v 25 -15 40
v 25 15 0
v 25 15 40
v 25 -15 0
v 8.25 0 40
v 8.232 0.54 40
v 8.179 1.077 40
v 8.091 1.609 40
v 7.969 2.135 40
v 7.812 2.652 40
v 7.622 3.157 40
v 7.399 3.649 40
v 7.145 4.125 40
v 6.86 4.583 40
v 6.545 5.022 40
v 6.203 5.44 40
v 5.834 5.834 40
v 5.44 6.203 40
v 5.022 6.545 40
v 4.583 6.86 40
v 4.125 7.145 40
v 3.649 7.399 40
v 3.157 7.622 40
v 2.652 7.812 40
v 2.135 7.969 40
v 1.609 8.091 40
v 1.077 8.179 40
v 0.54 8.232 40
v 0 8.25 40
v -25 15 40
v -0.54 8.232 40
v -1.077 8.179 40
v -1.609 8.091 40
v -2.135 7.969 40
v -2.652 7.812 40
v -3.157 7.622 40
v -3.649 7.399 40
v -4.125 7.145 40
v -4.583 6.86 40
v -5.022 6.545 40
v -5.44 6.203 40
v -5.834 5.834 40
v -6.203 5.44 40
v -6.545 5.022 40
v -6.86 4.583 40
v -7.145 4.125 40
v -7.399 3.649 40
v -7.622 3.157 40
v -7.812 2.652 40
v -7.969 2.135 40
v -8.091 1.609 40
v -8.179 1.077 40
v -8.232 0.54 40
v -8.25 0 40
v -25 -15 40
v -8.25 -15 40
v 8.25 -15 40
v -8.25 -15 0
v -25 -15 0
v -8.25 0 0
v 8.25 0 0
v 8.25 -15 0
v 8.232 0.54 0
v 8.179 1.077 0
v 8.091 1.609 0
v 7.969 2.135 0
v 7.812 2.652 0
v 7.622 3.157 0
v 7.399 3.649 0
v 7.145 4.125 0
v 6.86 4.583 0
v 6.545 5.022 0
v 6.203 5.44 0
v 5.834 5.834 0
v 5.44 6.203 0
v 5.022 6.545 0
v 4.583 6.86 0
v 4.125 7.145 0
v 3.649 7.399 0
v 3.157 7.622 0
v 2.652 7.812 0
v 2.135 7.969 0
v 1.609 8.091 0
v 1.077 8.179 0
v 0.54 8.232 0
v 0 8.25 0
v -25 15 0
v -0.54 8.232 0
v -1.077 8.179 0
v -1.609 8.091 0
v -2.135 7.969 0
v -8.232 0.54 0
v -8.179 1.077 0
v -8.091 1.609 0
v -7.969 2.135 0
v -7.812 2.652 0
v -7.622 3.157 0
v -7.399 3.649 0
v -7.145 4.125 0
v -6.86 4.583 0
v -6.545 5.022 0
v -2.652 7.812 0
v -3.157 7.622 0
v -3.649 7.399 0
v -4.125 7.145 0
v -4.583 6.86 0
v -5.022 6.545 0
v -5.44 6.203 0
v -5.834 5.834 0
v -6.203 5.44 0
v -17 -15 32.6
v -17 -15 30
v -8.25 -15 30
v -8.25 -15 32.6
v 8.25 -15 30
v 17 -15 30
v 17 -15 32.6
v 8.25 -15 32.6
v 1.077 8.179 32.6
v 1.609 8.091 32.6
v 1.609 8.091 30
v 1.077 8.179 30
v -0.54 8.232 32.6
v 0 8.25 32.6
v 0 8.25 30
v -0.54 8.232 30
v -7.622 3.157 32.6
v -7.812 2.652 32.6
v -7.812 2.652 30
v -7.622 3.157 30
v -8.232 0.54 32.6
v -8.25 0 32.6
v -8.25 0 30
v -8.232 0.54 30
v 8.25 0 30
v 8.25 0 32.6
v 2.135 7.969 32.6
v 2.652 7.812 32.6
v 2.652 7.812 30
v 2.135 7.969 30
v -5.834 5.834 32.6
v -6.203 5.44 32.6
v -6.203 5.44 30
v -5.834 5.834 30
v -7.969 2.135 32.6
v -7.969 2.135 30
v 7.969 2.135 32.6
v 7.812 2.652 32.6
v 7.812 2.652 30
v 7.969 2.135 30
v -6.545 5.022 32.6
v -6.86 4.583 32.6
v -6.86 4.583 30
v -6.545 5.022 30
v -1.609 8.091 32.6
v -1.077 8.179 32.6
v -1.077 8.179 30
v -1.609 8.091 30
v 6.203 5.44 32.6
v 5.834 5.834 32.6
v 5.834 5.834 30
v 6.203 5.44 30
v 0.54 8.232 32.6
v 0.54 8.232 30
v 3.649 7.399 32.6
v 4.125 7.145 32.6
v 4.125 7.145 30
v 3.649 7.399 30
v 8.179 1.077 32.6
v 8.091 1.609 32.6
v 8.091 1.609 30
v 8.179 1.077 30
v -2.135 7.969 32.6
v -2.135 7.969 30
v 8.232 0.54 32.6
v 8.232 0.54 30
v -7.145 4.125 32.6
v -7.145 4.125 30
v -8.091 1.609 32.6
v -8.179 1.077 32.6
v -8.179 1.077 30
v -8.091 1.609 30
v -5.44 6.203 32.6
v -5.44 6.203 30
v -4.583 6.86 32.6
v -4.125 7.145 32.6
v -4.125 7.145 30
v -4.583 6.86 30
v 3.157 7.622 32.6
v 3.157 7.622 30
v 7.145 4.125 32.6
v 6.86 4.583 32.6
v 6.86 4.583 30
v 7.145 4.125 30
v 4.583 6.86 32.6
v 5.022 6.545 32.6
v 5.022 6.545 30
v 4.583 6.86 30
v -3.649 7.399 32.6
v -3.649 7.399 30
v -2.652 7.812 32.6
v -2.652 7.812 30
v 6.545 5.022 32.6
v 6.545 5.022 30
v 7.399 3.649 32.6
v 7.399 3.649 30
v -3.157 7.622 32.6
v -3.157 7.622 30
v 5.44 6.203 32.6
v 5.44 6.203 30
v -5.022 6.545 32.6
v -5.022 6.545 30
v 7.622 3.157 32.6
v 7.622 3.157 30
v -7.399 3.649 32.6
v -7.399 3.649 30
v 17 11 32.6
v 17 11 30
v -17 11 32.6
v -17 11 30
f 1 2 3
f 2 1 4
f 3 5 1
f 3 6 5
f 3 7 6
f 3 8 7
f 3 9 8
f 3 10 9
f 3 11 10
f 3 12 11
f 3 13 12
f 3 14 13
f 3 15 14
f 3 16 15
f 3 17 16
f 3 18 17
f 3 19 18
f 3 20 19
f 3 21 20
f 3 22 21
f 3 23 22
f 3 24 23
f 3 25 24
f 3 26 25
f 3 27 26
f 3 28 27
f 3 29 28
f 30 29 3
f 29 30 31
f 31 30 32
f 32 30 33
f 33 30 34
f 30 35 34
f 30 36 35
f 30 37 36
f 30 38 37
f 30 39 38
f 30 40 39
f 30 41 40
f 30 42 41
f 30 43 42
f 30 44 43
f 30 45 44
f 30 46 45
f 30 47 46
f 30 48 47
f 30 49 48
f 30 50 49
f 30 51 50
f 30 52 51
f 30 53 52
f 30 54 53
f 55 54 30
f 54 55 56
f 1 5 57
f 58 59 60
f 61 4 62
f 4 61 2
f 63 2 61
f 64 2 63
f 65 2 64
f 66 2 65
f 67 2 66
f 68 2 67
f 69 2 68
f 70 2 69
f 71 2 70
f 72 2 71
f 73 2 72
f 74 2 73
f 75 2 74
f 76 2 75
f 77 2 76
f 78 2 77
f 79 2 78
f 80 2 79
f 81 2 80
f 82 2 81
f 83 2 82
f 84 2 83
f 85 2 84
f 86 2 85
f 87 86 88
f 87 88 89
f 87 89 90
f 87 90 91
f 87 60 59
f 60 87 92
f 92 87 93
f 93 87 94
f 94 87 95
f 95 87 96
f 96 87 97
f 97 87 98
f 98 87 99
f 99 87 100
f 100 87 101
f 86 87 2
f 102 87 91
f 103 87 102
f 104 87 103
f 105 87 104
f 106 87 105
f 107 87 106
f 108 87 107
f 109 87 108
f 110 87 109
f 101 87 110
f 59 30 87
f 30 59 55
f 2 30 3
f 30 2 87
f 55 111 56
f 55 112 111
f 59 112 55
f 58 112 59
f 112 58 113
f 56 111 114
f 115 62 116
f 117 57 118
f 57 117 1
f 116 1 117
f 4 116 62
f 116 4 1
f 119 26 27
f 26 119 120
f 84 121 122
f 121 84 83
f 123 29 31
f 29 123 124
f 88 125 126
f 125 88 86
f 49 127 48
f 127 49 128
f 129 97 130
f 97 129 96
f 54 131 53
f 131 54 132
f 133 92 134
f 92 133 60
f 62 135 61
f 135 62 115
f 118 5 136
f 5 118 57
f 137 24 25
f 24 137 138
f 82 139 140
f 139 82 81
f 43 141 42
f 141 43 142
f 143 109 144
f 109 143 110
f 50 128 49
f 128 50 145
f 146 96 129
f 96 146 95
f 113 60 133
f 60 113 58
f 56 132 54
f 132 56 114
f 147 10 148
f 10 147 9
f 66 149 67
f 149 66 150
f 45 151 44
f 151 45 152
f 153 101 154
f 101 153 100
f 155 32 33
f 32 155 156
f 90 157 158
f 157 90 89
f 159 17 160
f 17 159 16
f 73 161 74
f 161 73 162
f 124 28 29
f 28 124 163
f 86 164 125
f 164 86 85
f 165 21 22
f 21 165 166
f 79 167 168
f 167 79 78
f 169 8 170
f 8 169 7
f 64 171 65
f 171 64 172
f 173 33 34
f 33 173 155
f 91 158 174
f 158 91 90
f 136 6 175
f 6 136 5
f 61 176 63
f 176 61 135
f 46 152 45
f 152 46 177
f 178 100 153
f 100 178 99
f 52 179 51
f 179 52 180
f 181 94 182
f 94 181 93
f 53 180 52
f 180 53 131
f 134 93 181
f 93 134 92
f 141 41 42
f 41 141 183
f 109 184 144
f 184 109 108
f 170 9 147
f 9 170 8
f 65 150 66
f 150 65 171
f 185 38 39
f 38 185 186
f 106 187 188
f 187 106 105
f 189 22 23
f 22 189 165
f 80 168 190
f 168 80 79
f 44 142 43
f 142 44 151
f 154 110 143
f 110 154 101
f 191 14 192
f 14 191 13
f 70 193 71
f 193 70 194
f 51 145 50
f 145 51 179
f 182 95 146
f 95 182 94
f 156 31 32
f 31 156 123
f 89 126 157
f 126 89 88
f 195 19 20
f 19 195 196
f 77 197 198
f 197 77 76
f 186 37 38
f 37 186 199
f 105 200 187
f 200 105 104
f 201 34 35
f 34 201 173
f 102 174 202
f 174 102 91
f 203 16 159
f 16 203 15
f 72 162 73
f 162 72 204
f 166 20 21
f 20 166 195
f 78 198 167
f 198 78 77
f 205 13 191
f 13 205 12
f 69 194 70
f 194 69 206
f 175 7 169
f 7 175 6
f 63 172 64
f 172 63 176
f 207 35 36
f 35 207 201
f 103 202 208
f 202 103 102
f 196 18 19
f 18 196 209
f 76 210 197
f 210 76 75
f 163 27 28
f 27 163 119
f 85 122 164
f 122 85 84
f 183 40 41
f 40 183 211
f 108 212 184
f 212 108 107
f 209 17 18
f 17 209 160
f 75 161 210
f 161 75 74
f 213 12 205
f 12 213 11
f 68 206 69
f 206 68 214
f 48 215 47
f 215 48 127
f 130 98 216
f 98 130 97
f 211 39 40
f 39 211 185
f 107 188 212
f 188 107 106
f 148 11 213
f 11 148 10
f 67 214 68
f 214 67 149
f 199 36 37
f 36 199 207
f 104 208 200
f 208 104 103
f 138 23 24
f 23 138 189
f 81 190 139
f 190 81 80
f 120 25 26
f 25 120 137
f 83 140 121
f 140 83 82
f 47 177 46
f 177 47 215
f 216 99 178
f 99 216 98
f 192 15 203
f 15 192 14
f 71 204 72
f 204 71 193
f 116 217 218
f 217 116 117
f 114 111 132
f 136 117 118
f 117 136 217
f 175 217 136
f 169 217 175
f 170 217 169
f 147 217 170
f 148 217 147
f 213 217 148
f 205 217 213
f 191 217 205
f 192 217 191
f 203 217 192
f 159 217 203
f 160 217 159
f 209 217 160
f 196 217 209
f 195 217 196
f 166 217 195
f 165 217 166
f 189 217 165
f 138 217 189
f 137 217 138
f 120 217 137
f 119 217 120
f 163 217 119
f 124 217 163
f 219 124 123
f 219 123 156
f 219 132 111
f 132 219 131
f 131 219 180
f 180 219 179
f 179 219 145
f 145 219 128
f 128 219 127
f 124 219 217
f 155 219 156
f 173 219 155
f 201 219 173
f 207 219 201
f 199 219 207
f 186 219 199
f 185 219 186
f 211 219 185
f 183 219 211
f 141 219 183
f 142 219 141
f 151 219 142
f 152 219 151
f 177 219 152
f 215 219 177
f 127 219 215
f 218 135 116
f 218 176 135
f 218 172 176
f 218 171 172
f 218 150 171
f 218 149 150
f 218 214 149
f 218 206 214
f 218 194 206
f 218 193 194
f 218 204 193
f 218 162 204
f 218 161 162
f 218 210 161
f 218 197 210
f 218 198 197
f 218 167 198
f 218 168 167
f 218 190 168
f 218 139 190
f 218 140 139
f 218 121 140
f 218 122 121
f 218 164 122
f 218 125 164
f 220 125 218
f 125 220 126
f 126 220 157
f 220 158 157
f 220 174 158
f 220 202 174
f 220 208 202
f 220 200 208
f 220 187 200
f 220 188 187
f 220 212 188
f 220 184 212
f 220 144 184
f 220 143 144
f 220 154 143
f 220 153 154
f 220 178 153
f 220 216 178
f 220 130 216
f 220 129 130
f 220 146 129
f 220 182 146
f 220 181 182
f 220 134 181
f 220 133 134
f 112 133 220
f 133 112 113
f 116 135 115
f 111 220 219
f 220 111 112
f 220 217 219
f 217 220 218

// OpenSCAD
// KNOWN-WRONG PART (must fail): the wall-screw holes are missing
// Wall-mounted holder for a 10 mL syringe hanging upright, tip down (gravity-feed reservoir)
// Category: hardware. A block with a vertical U-shaped barrel channel open at the front, a
// horizontal slot that takes the finger flange, and two M4 wall-screw holes from front to back.
// Print: PETG or PLA, standing on its bottom face; the flange slot roof bridges 34 mm.
// SPDX-License-Identifier: CERN-OHL-P-2.0

/* [Holder] */
block = [50, 30, 40];     // X (width), Y (depth), Z (height) [mm]; back face at y = +15
channel_w = 16.5;         // 16 mm barrel + clearance; half-circle back end centred at (0, 0)
slot = [34, 2.6];         // flange slot width (X) and height (Z)
slot_z = 30;              // slot from z = 30 to 32.6
slot_back_y = 11;         // the slot reaches from the front face back to y = 11
screw_d = 4.5;            // M4 clearance
screw_x = 19;
screw_z = 15;

/* [Hidden] */
eps = 0.01;

difference() {
    translate([-block.x / 2, -block.y / 2, 0]) cube(block);
    // barrel channel, open toward -Y (the front)
    translate([0, 0, -1]) linear_extrude(block.z + 2) {
        circle(d = channel_w, $fn = 96);
        translate([-channel_w / 2, -block.y / 2 - 1]) square([channel_w, block.y / 2 + 1]);
    }
    // flange slot, cut in from the front face
    translate([-slot.x / 2, -block.y / 2 - 1, slot_z]) cube([slot.x, slot_back_y + block.y / 2 + 1, slot.y]);
    // wall-screw holes, front to back
}
